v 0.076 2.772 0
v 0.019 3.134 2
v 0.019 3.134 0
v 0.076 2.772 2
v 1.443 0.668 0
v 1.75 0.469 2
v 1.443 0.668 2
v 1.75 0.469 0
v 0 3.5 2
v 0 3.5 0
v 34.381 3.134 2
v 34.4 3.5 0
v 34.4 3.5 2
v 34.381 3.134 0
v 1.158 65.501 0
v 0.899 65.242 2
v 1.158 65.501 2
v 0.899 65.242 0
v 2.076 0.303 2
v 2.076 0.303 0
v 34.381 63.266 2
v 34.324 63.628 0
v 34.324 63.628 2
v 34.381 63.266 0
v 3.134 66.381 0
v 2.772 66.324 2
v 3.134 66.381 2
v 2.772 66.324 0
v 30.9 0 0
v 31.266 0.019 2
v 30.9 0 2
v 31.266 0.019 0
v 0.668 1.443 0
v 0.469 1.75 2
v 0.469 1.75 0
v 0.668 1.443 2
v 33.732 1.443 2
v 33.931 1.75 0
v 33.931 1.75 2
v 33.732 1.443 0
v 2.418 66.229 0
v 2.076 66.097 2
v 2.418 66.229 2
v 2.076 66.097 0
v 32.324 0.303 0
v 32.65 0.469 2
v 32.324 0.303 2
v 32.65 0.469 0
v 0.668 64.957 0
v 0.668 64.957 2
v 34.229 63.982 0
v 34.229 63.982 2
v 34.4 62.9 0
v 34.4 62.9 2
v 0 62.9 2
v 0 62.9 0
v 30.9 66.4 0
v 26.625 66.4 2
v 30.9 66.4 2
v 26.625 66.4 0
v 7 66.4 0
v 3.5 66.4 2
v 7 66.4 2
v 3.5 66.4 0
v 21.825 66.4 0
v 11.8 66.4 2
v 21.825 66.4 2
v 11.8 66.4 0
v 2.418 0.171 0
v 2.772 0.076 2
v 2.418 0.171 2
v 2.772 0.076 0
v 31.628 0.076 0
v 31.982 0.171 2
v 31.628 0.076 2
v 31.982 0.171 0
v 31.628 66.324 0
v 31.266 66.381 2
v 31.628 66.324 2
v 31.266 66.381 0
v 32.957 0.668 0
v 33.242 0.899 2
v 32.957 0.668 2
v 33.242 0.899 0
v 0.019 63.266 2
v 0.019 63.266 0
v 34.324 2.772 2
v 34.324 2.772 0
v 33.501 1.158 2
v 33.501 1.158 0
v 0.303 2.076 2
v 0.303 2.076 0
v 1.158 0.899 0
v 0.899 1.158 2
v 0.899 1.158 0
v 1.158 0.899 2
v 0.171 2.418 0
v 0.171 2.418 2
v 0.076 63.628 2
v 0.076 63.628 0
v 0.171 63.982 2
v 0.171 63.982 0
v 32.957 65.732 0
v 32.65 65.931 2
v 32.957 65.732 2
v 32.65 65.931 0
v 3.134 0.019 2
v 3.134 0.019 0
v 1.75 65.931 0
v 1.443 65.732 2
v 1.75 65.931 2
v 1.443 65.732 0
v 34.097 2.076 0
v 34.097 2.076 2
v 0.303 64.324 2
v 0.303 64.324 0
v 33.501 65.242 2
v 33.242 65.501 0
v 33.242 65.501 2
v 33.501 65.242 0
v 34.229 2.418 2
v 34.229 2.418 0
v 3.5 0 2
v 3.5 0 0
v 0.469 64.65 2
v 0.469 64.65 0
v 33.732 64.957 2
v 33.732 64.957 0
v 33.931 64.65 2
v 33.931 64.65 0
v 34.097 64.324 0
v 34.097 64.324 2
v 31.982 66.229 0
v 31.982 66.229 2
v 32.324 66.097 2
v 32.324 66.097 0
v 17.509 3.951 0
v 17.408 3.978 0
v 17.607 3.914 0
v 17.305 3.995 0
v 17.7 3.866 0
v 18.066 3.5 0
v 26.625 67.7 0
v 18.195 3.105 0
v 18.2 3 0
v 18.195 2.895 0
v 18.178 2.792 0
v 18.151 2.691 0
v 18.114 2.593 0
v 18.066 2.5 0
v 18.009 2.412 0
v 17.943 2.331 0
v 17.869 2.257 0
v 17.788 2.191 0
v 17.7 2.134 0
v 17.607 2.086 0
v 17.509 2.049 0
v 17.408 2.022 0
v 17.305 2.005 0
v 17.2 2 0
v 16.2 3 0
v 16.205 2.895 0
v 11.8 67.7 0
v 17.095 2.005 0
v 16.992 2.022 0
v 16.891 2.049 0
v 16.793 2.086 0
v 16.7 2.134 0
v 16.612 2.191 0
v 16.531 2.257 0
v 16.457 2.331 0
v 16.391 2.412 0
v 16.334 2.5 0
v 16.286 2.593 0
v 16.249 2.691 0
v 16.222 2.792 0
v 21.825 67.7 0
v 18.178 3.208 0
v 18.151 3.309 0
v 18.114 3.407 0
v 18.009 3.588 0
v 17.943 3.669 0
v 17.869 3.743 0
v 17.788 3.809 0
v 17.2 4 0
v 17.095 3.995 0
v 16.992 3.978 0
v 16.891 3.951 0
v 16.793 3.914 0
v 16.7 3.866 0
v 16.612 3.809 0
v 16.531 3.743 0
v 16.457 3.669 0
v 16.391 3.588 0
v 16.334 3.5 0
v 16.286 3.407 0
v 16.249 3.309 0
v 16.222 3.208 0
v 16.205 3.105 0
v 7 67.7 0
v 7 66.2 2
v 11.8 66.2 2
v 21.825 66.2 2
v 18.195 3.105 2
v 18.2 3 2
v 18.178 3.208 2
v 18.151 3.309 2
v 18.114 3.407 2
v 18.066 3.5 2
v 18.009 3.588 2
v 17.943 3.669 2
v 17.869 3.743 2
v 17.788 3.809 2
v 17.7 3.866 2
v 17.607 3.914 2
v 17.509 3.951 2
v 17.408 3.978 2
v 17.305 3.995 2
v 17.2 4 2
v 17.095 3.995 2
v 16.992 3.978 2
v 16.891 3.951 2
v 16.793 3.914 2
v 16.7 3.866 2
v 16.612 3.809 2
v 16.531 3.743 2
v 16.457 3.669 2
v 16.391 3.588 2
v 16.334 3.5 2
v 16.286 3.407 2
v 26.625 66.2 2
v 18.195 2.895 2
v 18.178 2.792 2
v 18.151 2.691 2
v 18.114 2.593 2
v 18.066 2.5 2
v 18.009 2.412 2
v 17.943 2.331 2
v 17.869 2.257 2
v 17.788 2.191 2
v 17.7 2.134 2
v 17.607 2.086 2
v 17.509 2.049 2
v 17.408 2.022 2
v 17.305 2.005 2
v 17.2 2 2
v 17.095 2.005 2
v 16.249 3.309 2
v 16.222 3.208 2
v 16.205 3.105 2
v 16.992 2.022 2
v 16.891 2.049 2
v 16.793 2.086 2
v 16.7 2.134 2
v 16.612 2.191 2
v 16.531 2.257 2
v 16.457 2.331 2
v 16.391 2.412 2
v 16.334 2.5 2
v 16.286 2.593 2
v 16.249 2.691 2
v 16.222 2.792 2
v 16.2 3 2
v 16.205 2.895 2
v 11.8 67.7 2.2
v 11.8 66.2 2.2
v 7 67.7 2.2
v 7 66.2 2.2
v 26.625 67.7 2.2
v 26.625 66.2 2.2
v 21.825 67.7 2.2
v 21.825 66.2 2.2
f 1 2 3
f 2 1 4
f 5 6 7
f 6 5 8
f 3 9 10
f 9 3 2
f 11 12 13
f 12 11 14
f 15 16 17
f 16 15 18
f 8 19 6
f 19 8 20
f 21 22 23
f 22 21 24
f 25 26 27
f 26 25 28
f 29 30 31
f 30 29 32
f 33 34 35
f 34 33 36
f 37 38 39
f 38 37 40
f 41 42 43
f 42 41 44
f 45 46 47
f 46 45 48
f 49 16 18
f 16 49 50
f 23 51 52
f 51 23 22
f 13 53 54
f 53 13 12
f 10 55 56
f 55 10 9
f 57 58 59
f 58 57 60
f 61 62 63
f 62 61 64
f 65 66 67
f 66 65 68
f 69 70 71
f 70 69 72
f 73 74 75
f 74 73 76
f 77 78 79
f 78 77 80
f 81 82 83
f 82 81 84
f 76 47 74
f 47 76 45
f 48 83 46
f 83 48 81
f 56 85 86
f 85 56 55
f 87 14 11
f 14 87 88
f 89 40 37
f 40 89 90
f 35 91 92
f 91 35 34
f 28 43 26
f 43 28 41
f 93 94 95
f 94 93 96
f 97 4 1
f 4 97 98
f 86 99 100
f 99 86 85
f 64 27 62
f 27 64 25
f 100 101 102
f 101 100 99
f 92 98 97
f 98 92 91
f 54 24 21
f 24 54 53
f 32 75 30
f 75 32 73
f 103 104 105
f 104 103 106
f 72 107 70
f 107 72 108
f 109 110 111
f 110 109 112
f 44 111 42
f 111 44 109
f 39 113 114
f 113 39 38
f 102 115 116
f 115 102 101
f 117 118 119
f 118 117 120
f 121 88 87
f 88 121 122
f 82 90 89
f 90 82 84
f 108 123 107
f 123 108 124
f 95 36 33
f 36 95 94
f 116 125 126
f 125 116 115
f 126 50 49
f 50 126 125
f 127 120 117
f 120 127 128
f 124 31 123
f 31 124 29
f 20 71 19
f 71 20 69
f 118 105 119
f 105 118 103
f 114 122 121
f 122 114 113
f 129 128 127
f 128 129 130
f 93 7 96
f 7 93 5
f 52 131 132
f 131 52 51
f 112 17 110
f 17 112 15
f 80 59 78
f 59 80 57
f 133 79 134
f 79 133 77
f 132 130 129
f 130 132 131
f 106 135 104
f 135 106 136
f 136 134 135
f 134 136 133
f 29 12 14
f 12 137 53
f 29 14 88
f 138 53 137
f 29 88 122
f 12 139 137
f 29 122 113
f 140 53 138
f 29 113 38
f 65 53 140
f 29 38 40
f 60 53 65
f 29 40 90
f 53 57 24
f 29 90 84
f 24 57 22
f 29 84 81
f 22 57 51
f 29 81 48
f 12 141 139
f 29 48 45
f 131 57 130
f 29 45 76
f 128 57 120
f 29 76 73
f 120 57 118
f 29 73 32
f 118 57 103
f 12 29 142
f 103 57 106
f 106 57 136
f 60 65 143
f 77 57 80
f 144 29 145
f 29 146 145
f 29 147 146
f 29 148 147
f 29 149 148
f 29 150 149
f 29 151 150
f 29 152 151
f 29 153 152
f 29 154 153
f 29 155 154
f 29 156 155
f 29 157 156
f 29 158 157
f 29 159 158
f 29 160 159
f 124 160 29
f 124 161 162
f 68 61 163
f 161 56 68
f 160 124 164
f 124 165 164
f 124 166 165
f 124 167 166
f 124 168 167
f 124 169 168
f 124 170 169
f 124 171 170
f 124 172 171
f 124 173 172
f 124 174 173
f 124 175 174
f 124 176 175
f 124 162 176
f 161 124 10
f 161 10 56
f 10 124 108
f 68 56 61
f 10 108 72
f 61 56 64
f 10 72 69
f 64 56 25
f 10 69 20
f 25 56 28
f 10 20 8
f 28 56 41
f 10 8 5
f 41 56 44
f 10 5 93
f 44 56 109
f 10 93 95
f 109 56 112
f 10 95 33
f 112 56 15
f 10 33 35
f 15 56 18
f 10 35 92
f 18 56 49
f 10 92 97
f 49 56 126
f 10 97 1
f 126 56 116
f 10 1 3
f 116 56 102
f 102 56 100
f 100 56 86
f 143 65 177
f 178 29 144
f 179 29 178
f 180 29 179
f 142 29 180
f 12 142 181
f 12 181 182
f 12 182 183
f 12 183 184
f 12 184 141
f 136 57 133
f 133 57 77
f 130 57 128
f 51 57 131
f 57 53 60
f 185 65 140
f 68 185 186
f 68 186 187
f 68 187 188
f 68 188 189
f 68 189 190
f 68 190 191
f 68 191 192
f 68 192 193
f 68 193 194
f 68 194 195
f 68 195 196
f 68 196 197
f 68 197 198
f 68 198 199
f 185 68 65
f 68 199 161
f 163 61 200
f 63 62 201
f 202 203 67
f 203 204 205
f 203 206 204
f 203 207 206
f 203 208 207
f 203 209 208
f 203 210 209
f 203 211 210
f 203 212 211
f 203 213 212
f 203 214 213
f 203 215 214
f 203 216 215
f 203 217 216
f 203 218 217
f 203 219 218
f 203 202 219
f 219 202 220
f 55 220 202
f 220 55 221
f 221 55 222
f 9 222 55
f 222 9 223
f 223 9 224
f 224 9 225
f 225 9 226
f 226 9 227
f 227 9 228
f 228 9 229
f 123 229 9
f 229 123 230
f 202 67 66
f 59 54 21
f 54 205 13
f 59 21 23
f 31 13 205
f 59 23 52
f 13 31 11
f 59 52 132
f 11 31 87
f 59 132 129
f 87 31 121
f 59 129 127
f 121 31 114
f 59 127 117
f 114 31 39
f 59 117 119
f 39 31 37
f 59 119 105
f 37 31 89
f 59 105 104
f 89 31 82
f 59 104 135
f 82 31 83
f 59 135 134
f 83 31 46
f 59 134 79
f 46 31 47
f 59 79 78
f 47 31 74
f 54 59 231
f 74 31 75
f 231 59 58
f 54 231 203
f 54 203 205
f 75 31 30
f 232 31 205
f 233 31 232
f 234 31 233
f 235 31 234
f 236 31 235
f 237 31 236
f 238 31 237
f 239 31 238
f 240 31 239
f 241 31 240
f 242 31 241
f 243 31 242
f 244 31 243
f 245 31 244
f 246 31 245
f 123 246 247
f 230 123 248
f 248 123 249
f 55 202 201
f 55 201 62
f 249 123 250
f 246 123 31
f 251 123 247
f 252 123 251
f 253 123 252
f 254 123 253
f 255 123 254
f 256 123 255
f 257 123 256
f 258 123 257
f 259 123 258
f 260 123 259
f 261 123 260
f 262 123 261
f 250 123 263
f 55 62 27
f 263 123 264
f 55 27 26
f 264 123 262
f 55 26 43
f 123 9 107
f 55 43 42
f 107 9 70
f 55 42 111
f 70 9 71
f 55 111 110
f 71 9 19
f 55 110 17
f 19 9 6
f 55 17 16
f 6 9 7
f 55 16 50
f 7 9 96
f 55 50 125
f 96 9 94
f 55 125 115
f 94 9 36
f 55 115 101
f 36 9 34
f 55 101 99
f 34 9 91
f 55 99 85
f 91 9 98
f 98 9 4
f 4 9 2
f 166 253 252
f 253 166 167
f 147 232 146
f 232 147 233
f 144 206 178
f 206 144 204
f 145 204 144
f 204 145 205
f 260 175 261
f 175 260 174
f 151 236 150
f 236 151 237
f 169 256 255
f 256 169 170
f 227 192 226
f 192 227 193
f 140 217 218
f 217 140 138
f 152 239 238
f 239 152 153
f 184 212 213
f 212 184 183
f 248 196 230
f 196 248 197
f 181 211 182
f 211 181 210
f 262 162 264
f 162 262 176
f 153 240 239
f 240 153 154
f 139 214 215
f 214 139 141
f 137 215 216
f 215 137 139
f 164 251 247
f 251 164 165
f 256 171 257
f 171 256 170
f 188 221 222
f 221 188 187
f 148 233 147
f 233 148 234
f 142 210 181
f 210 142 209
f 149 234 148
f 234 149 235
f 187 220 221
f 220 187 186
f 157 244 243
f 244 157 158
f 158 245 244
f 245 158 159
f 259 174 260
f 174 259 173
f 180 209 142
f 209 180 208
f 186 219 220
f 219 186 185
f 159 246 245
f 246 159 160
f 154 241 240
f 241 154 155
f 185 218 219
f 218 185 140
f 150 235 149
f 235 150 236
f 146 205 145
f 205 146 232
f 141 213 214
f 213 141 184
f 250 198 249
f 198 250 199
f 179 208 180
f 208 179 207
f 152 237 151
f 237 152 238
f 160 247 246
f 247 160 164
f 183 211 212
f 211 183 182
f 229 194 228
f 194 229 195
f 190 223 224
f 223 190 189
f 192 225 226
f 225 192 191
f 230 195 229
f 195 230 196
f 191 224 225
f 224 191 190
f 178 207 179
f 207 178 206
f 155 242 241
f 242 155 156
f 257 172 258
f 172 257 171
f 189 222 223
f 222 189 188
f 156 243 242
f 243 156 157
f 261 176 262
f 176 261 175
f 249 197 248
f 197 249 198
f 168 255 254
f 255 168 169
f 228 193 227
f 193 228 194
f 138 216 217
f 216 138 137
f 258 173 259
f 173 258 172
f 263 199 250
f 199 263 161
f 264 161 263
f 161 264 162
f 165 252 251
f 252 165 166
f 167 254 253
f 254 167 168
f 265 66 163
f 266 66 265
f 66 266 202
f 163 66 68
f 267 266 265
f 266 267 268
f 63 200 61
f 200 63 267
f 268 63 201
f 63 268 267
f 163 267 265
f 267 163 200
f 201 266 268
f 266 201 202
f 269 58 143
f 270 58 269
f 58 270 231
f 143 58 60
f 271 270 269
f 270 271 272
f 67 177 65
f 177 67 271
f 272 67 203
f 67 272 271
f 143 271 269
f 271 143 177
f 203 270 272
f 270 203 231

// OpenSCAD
// Battery Door Cover: 34mm (X) x 64mm (Y) x 4mm total recess
$fn = 60;

// Base Plate Dimensions (with -0.3mm print tolerance)
length = 34.4;   // Short axis (X)
width  = 66.4;   // Long axis (Y)
thickness = 2.0; // Base plate thickness
corner_r  = 3.5; // Corner fillet radius

// Screw Hole Specifications
hole_dia = 2.0;               // 2mm screw diameter
hole_x   = length / 2;        // 16.85mm (centered on 33.7mm plate)
hole_y   = 3.0;               // 3mm from the bottom edge

difference() {
    // --- 1. Main Base Plate ---
    linear_extrude(height = thickness) {
        hull() {
            translate([corner_r, corner_r]) circle(r = corner_r);
            translate([length - corner_r, corner_r]) circle(r = corner_r);
            translate([length - corner_r, width - corner_r]) circle(r = corner_r);
            translate([corner_r, width - corner_r]) circle(r = corner_r);
        }
    }

    // --- 2. Bottom Screw Hole ---
    translate([hole_x, hole_y, -1])
        cylinder(h = thickness + 2, d = hole_dia);
}

// --- 3. Top Retaining Tabs ---
tab_w   = 4.8; // Adjusted tab width (X)
tab_h   = 2.2;   // Tab height (Z)
tab_ext = 1.5;   // Extension length (Y)

// First Tab: starts at X = 7.0mm, ends at X = 12.075mm
translate([7.0, width - 0.2, 0])
    cube([tab_w, tab_ext, tab_h]);

// Second Tab: starts at X = 21.825mm (12.075 + 9.75 gap), ends at X = 26.9mm (leaves 7.5mm to right edge)
translate([21.825, width - 0.2, 0])
    cube([tab_w, tab_ext, tab_h]);
